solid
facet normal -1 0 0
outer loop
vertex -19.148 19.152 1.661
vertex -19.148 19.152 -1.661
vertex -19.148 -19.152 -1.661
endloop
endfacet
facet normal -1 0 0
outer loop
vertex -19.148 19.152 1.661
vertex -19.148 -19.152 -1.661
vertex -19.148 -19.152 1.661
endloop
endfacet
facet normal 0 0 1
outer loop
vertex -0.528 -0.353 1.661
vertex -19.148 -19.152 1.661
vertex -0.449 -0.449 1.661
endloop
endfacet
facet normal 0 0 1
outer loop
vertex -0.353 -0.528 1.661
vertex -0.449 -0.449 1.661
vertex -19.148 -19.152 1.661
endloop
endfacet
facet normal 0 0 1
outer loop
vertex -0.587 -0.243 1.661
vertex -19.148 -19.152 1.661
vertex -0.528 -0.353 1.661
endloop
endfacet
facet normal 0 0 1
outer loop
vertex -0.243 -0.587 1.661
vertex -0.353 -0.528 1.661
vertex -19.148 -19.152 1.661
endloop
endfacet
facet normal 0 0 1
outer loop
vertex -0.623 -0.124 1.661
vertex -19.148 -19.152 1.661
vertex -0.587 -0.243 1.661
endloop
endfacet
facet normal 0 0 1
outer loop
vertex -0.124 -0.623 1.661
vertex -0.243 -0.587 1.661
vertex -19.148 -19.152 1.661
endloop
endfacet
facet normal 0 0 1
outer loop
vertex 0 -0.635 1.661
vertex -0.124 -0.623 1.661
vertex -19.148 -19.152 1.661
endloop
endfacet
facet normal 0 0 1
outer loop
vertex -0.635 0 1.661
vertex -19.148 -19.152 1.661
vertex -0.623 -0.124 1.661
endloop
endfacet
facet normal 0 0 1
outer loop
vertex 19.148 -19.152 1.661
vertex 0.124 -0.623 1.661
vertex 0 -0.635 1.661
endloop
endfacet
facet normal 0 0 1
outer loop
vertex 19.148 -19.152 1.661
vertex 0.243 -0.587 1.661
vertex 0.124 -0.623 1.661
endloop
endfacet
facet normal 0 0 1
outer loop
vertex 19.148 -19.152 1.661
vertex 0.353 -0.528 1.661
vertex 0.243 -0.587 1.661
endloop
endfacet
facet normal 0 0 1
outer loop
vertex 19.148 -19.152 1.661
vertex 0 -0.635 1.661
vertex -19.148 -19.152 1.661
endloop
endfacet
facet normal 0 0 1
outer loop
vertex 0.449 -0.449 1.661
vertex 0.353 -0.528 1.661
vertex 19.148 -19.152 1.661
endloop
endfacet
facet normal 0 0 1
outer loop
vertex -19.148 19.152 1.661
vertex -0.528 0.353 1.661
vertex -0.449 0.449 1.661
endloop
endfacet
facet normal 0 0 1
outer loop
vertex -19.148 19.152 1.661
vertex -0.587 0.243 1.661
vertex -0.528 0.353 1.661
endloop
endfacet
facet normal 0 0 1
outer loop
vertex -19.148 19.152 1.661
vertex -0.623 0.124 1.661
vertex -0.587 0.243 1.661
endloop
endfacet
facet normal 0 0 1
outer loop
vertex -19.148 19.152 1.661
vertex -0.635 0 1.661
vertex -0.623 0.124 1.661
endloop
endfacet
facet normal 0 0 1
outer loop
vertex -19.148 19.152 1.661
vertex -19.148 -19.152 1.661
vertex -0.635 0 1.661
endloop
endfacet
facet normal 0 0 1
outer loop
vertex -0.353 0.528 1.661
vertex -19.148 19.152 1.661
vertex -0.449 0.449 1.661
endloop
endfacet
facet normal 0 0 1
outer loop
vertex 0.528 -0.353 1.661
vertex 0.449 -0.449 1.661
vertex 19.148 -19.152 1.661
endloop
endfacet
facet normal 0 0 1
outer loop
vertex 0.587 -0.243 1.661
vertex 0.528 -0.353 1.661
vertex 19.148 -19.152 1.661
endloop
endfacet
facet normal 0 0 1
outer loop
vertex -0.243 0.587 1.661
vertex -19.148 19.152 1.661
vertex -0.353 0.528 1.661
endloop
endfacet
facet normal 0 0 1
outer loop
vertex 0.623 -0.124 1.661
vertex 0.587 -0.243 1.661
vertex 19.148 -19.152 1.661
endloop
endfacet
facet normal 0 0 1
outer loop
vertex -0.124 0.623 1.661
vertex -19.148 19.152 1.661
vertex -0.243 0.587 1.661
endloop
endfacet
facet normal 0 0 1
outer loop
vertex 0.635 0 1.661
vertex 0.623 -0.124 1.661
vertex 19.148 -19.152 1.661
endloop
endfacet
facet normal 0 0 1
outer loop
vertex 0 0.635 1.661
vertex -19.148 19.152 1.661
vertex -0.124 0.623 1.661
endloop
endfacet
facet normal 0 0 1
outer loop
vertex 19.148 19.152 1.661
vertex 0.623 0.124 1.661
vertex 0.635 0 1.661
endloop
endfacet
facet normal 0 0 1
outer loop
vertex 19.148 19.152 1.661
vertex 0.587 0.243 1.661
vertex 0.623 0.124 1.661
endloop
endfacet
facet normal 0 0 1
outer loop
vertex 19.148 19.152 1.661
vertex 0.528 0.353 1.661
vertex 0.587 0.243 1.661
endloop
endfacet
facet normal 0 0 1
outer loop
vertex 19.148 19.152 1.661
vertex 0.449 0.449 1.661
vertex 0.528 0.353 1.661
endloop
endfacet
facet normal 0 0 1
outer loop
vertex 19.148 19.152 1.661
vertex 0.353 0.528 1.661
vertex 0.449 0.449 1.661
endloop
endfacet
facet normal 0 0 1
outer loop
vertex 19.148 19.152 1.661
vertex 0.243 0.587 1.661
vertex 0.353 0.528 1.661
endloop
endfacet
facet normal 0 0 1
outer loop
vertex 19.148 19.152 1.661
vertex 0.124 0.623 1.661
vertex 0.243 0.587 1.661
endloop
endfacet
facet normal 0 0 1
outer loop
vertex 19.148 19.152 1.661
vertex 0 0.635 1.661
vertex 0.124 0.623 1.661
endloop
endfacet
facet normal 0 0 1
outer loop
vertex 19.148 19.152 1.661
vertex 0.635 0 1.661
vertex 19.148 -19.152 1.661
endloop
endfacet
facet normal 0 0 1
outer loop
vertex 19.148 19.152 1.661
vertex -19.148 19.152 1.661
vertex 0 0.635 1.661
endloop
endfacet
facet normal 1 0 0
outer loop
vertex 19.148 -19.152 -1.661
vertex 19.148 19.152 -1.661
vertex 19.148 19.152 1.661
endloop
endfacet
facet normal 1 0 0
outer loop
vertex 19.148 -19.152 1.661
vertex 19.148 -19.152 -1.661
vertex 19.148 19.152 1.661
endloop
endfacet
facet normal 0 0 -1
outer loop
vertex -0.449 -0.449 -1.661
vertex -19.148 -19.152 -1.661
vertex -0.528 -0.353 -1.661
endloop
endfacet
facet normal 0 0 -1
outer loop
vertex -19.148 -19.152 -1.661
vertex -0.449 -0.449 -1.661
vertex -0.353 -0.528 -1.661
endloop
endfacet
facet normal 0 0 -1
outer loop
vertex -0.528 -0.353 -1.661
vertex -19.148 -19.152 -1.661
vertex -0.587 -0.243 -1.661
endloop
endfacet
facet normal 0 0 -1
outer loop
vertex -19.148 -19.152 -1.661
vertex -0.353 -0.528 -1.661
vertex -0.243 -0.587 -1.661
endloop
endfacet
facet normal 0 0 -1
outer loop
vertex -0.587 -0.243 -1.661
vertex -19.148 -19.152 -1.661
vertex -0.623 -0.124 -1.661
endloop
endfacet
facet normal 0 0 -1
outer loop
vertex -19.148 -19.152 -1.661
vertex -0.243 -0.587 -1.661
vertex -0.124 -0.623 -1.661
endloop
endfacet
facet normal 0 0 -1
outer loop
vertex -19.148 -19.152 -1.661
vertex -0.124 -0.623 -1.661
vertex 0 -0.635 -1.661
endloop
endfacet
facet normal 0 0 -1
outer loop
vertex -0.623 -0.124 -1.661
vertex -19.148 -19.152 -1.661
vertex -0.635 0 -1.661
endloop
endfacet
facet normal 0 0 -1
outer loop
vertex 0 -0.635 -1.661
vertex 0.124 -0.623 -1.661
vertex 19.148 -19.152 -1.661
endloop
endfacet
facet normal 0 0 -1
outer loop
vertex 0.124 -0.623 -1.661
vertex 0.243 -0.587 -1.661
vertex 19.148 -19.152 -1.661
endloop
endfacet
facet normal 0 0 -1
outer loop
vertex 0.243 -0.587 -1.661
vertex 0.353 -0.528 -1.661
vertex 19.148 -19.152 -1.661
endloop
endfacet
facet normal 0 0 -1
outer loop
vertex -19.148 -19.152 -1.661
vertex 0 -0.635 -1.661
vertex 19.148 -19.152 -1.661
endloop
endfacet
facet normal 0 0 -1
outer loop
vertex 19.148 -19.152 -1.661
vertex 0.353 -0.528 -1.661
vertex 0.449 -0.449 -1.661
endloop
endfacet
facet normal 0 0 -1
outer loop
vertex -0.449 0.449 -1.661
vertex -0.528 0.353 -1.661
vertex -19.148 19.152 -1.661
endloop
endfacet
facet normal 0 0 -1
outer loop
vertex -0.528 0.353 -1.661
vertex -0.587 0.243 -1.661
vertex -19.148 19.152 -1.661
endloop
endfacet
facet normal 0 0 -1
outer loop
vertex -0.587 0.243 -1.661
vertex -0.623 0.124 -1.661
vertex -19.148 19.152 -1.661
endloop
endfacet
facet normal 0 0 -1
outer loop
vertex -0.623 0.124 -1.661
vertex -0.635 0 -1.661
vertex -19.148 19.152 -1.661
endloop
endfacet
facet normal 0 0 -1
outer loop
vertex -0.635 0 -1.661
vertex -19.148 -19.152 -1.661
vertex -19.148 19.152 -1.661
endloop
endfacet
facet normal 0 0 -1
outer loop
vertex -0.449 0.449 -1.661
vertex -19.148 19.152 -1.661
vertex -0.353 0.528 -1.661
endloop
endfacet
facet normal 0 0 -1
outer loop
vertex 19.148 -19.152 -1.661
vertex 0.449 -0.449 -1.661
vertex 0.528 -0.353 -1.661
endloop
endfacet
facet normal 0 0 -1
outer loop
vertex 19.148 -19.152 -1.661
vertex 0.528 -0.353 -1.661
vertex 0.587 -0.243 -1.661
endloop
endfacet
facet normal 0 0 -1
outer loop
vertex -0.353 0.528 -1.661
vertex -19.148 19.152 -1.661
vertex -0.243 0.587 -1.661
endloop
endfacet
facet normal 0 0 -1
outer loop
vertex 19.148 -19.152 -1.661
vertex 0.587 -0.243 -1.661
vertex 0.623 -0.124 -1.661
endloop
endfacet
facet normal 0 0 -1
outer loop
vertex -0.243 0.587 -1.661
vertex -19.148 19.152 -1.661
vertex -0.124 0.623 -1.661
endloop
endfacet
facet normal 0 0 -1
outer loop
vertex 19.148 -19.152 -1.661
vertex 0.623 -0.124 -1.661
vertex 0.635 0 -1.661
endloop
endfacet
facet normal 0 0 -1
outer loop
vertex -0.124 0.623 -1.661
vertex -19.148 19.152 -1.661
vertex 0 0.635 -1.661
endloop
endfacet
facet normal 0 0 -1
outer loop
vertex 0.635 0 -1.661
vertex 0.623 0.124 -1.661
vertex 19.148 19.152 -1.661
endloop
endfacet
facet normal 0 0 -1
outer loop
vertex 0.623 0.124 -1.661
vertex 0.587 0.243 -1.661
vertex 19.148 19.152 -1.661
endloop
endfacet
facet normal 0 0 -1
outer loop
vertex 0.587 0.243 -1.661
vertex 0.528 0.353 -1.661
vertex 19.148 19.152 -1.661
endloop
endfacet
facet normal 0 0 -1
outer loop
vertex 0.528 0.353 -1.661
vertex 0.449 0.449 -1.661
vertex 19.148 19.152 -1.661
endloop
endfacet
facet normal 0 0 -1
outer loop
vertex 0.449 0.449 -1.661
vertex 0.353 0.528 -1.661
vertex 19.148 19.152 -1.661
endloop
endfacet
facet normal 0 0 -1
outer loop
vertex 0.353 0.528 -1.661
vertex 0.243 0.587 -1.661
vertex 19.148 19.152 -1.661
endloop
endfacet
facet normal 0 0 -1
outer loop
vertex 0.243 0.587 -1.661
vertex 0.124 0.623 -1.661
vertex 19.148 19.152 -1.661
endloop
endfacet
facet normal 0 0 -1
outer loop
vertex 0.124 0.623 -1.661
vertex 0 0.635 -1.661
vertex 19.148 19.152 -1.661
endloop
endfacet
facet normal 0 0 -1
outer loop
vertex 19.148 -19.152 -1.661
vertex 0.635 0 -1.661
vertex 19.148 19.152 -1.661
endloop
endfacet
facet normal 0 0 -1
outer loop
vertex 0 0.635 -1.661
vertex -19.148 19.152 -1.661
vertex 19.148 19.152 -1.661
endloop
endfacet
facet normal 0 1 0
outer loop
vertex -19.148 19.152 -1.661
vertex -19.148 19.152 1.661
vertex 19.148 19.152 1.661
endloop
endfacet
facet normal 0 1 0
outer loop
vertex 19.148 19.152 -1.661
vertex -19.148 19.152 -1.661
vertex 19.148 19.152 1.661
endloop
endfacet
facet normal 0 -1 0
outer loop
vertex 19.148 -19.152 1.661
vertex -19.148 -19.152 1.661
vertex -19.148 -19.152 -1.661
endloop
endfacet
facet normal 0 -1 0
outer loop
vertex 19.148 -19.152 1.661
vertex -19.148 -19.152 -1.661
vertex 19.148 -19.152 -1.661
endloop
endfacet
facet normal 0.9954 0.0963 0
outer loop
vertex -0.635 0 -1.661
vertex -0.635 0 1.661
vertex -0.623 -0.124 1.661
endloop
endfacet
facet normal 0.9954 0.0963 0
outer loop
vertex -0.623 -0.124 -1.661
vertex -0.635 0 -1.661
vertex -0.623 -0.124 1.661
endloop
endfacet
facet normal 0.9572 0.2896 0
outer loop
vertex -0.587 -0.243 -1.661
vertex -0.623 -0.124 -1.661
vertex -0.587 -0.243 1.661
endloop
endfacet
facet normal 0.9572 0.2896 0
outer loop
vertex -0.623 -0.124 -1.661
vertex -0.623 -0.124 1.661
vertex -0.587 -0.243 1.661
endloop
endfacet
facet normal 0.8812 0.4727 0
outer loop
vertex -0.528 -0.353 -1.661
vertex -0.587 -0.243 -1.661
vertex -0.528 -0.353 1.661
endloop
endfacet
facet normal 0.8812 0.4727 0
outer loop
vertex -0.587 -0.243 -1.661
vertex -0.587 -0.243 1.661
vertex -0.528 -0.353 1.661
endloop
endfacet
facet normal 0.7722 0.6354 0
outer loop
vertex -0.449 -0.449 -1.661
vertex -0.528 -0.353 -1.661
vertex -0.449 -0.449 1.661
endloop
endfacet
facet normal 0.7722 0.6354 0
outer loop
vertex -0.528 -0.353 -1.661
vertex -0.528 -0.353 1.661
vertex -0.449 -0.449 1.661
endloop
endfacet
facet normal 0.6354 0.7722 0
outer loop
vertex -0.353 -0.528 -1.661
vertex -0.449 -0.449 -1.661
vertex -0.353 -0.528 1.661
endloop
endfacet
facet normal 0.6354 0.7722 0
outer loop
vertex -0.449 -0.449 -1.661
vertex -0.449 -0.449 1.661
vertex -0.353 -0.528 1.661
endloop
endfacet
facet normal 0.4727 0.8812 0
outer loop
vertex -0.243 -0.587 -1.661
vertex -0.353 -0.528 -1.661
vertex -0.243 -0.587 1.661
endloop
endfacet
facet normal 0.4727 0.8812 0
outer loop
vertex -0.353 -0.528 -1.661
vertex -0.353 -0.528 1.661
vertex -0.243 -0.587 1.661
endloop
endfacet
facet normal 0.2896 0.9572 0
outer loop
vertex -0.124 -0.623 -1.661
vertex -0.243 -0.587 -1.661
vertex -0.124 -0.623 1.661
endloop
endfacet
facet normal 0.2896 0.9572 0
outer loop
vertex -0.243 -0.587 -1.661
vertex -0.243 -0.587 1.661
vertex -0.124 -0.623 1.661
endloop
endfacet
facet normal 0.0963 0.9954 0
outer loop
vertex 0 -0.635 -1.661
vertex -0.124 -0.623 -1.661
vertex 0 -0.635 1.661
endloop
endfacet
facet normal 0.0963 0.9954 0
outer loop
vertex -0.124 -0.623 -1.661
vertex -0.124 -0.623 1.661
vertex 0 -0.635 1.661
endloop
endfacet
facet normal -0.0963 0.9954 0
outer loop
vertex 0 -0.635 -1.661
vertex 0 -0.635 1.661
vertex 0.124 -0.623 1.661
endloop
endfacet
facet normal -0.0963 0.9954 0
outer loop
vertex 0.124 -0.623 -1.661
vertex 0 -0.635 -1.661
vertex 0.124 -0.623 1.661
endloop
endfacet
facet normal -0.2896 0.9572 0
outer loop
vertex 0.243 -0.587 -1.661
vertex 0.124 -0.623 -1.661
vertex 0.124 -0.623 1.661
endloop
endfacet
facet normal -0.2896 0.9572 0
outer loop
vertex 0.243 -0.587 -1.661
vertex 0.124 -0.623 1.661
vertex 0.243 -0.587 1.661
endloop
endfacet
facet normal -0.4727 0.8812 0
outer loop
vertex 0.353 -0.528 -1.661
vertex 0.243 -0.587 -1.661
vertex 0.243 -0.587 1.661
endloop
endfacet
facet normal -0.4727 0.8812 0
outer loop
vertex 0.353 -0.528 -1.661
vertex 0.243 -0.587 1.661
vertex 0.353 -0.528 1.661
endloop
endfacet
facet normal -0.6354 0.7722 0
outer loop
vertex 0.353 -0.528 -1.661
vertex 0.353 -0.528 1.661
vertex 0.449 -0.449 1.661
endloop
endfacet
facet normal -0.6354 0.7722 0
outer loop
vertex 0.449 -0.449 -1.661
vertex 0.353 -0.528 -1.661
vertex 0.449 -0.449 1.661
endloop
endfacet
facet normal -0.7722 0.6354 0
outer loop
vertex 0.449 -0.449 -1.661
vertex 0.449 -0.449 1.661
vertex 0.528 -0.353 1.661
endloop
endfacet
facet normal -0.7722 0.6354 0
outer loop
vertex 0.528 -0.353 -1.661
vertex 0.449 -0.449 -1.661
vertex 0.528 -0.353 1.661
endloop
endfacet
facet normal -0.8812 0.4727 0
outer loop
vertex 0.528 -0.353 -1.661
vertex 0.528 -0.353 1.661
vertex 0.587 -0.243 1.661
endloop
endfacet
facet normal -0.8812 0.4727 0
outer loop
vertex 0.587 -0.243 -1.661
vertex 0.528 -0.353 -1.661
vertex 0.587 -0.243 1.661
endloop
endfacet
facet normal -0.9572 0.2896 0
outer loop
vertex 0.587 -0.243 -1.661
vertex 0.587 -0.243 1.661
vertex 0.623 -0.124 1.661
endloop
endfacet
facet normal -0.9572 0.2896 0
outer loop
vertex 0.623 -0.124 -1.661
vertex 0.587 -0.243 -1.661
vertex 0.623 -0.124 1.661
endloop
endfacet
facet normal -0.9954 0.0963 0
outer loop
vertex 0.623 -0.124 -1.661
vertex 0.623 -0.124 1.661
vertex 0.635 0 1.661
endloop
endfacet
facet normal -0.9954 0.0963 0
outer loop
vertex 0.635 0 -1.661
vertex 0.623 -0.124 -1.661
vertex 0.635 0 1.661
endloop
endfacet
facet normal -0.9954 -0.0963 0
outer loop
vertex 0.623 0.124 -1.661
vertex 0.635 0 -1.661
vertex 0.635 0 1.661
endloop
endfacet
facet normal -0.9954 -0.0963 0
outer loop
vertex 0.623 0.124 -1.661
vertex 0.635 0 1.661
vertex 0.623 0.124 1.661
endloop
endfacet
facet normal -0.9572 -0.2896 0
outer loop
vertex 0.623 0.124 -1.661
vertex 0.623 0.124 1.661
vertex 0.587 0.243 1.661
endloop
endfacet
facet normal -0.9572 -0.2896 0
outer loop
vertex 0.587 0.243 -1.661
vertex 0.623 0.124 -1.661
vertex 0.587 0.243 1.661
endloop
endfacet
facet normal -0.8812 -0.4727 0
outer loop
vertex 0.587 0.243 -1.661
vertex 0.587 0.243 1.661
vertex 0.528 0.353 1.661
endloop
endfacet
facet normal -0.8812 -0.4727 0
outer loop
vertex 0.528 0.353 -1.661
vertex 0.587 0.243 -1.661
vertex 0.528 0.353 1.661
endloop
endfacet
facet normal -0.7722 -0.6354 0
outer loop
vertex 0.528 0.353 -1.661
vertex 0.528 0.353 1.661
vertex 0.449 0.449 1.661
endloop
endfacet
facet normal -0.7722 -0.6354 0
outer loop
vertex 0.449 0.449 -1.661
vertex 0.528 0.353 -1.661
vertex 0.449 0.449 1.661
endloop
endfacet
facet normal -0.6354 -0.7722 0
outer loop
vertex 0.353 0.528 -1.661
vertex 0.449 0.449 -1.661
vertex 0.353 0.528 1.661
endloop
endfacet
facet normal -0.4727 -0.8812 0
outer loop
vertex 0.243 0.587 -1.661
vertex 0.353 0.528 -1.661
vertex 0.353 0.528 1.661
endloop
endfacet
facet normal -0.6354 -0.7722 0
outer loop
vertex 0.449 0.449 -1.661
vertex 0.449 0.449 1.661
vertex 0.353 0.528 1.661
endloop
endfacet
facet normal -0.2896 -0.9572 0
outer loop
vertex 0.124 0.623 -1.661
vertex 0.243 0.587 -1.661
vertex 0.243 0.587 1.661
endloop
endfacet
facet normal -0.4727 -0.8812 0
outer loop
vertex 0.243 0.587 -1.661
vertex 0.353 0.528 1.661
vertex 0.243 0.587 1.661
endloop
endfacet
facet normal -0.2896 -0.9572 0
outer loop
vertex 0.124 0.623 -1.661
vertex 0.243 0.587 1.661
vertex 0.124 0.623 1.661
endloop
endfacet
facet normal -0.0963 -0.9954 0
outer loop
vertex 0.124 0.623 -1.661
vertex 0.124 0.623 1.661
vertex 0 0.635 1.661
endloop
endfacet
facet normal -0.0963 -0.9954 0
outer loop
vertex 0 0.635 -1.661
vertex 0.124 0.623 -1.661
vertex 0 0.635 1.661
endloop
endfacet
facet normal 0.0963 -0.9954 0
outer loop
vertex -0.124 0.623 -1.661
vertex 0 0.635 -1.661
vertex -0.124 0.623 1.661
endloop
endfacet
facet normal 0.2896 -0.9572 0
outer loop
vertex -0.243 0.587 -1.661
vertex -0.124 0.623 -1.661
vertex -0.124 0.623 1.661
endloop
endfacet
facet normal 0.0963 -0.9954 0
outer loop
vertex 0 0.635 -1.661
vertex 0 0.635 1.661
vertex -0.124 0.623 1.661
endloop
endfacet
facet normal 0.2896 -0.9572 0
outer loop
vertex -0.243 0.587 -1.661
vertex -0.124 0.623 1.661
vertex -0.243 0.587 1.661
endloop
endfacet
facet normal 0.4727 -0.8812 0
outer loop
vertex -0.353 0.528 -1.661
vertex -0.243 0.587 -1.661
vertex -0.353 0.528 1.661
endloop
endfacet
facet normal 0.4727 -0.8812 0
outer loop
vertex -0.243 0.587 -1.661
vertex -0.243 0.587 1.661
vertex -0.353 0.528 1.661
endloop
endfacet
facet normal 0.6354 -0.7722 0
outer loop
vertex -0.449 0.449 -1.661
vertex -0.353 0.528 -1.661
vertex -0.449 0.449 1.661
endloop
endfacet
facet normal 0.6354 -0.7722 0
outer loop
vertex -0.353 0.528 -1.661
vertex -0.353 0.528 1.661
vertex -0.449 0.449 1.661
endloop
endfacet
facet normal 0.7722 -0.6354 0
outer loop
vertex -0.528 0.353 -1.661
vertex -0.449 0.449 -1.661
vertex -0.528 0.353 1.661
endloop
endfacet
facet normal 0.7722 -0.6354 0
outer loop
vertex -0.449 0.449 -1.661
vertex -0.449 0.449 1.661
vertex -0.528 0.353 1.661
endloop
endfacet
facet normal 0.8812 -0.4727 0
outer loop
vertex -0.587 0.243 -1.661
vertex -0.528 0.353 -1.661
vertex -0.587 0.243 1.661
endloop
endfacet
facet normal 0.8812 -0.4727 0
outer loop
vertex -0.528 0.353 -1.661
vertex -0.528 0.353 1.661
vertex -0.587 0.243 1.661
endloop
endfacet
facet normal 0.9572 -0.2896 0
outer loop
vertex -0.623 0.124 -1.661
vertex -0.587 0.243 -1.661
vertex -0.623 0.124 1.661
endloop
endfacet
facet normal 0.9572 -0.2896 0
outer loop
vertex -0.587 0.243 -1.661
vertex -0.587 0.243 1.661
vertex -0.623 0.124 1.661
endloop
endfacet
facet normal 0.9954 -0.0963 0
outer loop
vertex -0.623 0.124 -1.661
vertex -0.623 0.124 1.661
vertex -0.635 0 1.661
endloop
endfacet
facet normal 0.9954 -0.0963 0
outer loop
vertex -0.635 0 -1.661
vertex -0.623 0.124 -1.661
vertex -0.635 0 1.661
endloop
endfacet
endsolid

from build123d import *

# Parameters (mm, degrees)
F0_W     = 38.2953807712
F0_H     = 3.3215386793
F1_DEPTH = 38.3032
F4_D     = 1.27


with BuildPart() as f1:
    # F0 (on Front) → F1 (new body)
    with BuildSketch(Plane.XZ):
        Rectangle(F0_W, F0_H)
    extrude(amount=F1_DEPTH)


with BuildPart() as f1_1:
    # F2: moved
    add(f1.part.moved(Location((0, 19.1516, 0))))

    # F4 (through all)
    with Locations(Plane(origin=(0, 0, -1.6607693397), x_dir=(1, 0, 0), z_dir=(0, 0, -1))):
        with Locations((0, 0)):
            Hole(F4_D / 2)


solid = f1_1.part
